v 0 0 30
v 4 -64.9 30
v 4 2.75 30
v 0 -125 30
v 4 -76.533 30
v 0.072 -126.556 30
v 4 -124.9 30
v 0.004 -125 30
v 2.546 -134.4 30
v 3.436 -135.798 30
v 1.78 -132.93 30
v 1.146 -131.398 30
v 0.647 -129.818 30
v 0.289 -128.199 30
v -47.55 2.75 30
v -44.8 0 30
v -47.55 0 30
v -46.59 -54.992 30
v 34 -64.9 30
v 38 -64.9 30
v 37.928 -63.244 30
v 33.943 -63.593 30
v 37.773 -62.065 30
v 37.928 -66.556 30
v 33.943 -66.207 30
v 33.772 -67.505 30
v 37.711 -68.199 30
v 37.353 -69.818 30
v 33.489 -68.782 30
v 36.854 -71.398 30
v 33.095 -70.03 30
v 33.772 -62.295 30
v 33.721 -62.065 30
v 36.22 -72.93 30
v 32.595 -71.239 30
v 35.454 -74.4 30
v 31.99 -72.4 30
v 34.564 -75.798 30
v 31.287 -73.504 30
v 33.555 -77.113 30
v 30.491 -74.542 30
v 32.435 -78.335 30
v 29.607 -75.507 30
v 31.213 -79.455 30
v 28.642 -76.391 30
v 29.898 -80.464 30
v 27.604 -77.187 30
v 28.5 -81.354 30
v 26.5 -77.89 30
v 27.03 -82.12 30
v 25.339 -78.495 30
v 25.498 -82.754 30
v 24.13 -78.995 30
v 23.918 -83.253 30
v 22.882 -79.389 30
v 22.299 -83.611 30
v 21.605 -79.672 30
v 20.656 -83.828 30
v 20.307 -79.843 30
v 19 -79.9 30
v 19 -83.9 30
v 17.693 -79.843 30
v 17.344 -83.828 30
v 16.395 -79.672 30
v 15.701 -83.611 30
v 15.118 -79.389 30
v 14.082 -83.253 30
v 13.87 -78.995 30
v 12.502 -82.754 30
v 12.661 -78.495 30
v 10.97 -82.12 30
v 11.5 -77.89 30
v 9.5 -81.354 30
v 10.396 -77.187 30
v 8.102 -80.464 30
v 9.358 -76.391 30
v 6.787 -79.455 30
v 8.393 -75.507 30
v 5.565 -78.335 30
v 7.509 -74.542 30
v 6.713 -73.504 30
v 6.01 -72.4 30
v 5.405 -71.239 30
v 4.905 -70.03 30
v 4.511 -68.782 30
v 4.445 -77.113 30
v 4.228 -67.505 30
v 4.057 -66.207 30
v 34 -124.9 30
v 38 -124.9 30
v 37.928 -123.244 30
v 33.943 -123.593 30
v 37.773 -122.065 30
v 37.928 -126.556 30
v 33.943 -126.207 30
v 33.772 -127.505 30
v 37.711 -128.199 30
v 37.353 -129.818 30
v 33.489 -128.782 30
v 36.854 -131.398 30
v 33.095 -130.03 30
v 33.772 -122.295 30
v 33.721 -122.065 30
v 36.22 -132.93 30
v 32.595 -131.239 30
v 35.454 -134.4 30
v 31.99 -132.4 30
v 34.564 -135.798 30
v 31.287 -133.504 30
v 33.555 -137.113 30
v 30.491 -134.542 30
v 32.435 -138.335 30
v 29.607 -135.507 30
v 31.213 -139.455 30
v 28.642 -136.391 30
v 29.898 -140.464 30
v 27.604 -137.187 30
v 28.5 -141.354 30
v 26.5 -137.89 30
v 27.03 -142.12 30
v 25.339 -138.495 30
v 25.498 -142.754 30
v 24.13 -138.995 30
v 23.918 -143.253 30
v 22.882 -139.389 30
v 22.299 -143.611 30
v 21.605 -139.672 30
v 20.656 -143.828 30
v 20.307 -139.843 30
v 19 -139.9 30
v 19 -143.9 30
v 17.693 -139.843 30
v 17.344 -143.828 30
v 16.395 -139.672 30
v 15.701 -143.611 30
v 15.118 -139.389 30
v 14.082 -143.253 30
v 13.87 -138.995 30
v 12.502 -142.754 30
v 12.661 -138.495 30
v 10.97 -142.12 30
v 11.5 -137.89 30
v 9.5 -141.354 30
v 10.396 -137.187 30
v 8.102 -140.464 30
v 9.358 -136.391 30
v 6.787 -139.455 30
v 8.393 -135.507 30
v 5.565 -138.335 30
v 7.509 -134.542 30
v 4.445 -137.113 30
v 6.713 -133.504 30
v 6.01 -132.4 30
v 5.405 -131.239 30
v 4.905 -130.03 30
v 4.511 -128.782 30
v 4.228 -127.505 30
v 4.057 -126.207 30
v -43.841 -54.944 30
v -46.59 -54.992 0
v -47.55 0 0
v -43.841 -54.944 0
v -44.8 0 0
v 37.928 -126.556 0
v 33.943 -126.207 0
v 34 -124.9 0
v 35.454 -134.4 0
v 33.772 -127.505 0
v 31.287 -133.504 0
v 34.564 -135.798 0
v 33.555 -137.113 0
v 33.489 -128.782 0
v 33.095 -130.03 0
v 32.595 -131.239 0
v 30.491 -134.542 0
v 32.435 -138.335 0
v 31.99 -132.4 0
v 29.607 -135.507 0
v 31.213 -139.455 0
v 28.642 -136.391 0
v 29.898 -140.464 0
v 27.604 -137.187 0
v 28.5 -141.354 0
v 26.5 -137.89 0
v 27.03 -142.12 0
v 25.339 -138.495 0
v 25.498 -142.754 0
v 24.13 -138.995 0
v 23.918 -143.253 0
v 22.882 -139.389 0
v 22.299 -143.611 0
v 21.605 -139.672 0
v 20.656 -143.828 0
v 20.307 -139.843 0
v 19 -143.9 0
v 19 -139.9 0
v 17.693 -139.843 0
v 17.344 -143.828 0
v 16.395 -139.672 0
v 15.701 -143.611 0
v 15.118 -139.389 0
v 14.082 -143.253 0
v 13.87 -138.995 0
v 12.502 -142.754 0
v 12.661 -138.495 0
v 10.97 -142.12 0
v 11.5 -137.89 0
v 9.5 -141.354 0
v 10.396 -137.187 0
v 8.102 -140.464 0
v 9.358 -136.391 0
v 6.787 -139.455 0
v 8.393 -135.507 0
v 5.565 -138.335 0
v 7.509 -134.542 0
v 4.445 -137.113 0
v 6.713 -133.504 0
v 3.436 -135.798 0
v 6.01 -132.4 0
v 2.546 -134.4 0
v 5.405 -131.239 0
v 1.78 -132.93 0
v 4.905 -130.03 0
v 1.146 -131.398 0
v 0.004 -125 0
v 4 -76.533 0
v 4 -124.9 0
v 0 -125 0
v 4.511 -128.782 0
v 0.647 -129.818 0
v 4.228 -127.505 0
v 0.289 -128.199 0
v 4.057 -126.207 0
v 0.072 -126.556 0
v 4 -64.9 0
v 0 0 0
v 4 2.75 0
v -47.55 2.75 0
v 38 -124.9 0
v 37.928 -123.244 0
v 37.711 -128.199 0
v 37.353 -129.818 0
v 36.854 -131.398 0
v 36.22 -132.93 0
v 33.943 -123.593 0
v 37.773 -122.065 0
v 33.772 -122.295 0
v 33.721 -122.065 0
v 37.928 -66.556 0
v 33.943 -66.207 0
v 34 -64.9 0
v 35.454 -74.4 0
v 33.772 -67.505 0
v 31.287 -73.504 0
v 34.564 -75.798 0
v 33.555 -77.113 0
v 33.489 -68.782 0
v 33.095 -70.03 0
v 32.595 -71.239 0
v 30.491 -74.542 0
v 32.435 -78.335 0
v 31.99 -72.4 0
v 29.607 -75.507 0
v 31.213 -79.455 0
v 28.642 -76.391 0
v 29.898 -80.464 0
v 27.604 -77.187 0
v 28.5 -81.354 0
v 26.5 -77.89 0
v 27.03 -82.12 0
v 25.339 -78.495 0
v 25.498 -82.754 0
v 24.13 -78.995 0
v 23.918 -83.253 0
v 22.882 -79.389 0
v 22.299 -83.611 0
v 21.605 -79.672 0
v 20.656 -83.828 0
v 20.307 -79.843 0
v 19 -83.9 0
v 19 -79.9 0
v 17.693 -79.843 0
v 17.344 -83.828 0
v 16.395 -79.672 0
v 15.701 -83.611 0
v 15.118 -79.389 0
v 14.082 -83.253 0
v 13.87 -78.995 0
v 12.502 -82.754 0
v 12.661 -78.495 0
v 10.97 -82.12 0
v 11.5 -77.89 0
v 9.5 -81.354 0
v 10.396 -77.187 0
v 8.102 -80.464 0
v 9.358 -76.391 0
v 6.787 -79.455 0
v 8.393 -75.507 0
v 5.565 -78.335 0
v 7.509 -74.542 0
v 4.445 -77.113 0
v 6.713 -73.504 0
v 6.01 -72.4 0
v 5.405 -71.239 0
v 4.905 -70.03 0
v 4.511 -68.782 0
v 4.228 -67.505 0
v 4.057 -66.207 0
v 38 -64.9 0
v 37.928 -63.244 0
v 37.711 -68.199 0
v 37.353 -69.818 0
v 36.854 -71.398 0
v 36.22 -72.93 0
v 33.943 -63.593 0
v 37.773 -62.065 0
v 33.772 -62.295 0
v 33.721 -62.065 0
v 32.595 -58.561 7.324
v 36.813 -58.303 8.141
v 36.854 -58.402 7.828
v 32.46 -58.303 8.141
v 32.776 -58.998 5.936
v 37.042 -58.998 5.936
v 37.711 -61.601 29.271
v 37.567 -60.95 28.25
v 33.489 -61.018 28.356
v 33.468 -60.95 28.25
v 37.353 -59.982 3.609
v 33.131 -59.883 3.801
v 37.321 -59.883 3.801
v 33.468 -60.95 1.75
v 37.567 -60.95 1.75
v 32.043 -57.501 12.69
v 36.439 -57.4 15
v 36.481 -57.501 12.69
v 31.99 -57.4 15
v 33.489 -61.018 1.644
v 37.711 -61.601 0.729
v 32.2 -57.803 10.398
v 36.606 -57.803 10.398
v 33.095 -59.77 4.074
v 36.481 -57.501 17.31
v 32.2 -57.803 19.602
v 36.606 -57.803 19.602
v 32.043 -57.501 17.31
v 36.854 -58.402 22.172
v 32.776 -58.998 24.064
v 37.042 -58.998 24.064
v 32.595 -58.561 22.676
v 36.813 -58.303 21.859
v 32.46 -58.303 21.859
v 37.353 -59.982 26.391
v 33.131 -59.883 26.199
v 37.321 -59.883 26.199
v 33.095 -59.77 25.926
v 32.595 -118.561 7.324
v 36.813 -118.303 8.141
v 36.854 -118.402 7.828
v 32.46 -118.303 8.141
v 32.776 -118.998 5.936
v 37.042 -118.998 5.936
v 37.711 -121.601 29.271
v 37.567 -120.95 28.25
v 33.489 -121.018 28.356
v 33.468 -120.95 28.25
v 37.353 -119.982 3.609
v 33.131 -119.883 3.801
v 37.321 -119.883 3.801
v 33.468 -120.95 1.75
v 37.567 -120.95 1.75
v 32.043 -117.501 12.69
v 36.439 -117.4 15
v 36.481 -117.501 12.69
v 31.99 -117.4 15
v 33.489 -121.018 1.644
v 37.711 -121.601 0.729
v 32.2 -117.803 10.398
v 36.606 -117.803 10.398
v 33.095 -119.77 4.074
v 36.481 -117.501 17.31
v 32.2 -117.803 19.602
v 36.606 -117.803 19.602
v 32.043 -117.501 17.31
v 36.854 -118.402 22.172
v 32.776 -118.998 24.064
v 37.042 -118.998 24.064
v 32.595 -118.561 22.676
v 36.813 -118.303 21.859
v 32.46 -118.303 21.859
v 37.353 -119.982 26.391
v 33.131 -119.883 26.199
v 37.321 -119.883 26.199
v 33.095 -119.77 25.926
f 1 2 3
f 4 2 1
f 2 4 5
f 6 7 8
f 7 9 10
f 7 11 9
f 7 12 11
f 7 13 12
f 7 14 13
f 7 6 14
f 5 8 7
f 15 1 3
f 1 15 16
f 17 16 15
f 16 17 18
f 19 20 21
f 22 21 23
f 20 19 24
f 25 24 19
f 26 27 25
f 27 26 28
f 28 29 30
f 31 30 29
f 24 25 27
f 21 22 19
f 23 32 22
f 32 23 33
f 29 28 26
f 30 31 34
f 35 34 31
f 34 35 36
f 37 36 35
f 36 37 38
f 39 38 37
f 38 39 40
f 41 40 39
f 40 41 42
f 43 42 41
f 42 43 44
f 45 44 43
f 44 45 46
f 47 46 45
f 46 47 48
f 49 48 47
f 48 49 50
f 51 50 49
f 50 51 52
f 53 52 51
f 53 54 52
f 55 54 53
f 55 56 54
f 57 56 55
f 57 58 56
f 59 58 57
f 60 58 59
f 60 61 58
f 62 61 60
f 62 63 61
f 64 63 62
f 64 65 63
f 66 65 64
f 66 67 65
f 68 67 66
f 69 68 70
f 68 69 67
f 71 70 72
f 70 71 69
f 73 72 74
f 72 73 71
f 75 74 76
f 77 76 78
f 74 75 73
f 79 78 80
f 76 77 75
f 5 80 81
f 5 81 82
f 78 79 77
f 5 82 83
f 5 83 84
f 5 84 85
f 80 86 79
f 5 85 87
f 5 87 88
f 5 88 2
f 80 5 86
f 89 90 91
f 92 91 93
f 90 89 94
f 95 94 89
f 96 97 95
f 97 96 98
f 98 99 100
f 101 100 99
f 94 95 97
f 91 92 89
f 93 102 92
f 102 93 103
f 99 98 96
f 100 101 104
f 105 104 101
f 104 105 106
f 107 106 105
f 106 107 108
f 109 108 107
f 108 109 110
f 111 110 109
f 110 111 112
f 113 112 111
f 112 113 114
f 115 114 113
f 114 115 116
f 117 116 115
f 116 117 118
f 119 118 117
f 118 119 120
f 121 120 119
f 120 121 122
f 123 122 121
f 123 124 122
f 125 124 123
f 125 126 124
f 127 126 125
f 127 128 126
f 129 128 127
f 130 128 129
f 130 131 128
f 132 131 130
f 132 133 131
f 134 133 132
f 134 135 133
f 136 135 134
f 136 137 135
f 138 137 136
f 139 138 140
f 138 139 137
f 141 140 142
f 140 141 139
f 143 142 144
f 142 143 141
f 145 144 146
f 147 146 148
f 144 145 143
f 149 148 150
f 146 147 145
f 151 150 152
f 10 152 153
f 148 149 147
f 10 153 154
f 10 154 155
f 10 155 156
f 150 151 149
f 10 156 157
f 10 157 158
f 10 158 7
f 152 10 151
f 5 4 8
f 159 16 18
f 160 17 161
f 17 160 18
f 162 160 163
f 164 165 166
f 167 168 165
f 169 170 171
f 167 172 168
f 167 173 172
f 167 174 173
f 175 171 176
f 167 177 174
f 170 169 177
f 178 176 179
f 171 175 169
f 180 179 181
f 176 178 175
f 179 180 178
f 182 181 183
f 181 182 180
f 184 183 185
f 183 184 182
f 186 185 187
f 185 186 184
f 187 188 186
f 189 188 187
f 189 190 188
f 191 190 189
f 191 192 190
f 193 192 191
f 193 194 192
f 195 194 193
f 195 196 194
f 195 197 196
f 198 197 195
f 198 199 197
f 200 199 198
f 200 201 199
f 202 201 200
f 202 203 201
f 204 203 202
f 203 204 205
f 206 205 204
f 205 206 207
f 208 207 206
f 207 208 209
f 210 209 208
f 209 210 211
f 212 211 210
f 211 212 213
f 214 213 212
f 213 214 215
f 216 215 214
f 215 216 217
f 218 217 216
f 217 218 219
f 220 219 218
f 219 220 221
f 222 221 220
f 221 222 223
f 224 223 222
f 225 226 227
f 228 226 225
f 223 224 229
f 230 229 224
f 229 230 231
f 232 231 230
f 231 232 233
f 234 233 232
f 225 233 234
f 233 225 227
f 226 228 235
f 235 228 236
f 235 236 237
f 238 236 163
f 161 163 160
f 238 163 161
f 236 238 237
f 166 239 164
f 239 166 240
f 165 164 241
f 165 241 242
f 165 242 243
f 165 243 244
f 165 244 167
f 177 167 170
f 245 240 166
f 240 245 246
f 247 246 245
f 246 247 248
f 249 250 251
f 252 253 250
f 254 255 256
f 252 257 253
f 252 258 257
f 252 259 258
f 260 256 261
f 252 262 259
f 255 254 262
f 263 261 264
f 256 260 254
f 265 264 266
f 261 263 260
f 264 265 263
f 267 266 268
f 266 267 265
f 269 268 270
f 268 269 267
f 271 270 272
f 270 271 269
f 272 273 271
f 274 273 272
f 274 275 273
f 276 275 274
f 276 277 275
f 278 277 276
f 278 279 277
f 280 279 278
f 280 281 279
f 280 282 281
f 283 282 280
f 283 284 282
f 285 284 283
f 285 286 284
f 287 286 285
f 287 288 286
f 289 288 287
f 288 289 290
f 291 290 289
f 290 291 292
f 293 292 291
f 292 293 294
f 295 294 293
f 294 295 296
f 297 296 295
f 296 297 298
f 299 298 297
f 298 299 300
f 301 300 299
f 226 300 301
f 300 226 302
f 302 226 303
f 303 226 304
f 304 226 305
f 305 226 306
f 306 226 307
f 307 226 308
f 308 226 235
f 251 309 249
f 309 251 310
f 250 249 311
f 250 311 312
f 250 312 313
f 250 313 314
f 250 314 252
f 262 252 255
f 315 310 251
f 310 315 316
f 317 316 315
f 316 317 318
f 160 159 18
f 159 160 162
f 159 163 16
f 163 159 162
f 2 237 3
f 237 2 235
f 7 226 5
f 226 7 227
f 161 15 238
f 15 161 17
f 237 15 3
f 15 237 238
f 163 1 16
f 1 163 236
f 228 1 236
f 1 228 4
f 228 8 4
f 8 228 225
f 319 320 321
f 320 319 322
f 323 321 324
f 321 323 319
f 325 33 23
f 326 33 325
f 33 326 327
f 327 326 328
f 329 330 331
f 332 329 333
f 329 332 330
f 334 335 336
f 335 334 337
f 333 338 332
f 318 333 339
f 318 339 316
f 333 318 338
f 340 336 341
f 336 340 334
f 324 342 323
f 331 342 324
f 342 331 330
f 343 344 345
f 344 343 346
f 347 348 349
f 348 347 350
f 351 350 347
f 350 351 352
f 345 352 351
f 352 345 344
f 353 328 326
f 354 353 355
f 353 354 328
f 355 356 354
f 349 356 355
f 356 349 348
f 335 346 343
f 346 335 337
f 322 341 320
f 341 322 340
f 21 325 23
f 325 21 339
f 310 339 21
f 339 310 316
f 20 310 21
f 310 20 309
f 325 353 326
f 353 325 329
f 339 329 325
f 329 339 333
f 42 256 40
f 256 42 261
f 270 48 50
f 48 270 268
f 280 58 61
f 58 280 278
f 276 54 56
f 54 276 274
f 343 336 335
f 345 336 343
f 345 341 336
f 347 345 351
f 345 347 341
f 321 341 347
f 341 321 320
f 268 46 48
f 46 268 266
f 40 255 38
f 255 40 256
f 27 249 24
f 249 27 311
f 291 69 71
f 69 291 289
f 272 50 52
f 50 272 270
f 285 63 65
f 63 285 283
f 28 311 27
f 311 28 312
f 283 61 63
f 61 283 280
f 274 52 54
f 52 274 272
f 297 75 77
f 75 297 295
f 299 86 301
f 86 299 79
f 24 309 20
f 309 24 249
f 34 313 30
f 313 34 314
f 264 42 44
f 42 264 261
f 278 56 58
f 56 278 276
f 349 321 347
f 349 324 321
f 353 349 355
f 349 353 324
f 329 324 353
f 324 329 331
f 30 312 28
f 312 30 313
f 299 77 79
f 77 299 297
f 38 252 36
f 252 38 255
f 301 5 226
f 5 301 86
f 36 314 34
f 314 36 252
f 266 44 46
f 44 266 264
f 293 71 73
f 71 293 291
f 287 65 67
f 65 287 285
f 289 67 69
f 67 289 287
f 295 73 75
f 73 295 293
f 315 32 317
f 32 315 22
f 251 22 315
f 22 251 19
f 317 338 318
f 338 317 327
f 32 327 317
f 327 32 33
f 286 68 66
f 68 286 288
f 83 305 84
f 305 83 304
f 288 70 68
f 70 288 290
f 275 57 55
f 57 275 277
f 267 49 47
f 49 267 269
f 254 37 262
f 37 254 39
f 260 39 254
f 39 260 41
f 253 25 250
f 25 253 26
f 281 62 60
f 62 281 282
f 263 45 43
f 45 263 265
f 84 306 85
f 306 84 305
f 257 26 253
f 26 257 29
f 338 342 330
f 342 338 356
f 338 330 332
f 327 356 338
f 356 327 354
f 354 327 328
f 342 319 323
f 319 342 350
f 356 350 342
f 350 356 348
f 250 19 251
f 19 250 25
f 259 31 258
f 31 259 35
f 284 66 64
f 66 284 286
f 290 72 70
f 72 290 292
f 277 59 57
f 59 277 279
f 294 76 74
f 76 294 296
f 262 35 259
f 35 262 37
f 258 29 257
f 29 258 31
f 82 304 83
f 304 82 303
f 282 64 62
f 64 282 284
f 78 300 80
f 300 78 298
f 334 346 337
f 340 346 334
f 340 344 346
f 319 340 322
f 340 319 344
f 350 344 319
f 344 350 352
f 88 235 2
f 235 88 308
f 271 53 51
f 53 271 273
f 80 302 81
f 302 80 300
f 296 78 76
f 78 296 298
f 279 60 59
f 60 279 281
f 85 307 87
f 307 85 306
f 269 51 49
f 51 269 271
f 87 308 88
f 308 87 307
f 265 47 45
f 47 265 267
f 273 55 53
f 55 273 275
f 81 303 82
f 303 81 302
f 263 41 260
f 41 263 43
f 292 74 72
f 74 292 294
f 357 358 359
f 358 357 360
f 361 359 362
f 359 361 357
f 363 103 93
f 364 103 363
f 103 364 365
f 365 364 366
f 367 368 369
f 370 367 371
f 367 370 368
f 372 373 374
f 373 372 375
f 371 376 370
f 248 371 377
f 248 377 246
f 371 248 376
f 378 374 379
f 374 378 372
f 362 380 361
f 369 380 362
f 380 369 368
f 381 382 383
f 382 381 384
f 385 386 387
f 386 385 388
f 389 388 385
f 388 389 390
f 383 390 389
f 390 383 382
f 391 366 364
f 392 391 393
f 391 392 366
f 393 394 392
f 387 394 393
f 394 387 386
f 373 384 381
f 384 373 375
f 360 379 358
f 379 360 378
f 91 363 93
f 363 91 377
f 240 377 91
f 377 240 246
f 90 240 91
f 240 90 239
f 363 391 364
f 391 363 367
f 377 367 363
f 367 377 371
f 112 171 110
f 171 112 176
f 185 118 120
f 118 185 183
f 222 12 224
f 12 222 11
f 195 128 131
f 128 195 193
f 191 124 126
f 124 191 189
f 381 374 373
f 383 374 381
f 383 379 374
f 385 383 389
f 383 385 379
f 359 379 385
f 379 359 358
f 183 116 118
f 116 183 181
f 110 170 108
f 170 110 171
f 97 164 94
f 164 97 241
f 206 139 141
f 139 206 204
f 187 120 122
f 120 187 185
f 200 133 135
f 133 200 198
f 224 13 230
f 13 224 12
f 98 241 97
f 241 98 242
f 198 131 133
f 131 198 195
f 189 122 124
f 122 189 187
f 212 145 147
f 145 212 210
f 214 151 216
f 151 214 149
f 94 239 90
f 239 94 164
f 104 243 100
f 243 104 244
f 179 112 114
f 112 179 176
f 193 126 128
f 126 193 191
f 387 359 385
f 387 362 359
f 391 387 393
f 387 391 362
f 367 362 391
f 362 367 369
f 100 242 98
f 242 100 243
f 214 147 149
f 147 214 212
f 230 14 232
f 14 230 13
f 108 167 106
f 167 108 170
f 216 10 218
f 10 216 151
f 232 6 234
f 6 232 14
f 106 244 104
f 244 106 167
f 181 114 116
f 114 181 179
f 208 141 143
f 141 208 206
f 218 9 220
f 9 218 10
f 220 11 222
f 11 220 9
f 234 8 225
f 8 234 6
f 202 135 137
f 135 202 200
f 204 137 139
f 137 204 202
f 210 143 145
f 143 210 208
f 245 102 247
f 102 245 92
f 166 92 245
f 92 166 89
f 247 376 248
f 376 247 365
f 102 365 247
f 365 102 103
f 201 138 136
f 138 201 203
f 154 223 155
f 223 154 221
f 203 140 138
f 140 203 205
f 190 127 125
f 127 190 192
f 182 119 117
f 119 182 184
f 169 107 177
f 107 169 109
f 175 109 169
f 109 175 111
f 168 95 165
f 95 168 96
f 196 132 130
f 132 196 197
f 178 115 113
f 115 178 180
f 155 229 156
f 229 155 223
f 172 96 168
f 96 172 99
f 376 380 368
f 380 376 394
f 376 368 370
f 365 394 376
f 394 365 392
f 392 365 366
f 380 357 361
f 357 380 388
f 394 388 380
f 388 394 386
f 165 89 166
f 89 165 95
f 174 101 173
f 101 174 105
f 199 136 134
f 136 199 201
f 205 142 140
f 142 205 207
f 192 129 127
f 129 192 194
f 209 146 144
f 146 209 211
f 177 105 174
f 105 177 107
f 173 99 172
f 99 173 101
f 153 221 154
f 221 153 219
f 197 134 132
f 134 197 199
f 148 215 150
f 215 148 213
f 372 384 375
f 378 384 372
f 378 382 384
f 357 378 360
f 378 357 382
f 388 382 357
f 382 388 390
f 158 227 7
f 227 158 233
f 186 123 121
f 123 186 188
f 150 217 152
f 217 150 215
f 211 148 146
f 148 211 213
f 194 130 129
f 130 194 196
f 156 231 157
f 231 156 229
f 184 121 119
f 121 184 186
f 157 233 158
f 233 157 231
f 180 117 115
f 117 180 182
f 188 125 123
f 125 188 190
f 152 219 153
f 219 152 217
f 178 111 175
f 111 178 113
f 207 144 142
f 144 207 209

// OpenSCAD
/* [Door parameters] */
// Door thickness (inner distance between front and back of door hook)
clip_depth = 44.8;
// Thickness of top and overhang (make sure it fits gap between door and frame)
top_and_back_thickness = 2.75;

/* [Hook parameters] */
// Width of entire hook
width = 30;
// Thickness of front piece and hanger hooks
hook_and_front_thickness = 4;
// Length of overhang on back side of the door
clip_length = 55;


number_of_hooks = 2;
// Distance between top of door and first hanger hook
first_hook_offset = 65;  // rounded: 60
// Distance between successive hanger hooks (if more than one)
hook_distance = 60;  // rounded: 60
// Radius of hanger hook curve
hook_radius = 15;

hook_style = "rounded"; // [simple:Simple,rounded:Rounded]

/* [Advanced] */

// Angle back of clip inwards (towards door), to help with friction; don't go crazy with this or you'll put too much stress on clip
clip_angle = 1;
// Add support buttress on hooks (except last); might help reduce flex, but looks a bit uglier (IMO)
inner_hook_buttress = 0; // [0:No,1:Yes]


/* [Hidden] */

$fn = 72;
thickness = hook_and_front_thickness;
top_thickness = top_and_back_thickness;

module hook_base() {
  difference() {
    cylinder(h=width, r=hook_radius+thickness);
    translate([0,0,-1])
      cylinder(h=width+2, r=hook_radius);
    translate([-hook_radius-thickness-1, 0, -1]) 
      cube([2*(hook_radius+thickness+1), hook_radius+thickness+1, width+2]); 
  }
}

module simple_hook() {
  translate([hook_radius+thickness, 0, 0]) union() {
    hook_base();
    translate([hook_radius+thickness/2, 0, 0])
      cylinder(h=width, r=thickness/2, $fn=18);
  }
}

module rounded_hook0() {
  translate([hook_radius+thickness, 0, 0]) union(r=2) {
    hook_base();
    translate([thickness+hook_radius, 0, width/2]) rotate([0, 90, 180]) difference() {
      cylinder(h=thickness, r=width/2);
      //translate([-width/2, -width/2, 0]) cube([width,width,thickness]);
      translate([-width-1, .5, -1])
        cube([2*width+2, width+1, thickness+2]);
    }
  }
}

module rounded_hook() {
  translate([0, -hook_radius-thickness, 0]) difference() {
    intersection() {
      cube([2*(hook_radius+thickness), 1.5*hook_radius+thickness+1, width]);
      translate([0, 0, width/2]) rotate([0, 90, 0]) cylinder(h=2*(hook_radius+thickness), r=1.5*hook_radius+thickness);
      translate([hook_radius+thickness, hook_radius+thickness, -1]) cylinder(r=hook_radius+thickness, h=width+2);
    }
    translate([hook_radius+thickness, hook_radius+thickness, -1]) cylinder(r=hook_radius, h=width+2);
    translate([-1, hook_radius+thickness, -1]) cube([hook_radius+thickness+2, hook_radius, width+2]);
  }
}

module hook() {
  if (hook_style == "simple") {
    simple_hook();
  } else if (hook_style == "rounded") {
    rounded_hook();
  }
}

module clip() {
  front_length = first_hook_offset + (number_of_hooks - 1) * hook_distance;
  union() {
    translate([-clip_depth-top_thickness, 0, 0]) rotate([0, 0, clip_angle]) translate([0, -clip_length, 0])
      cube([top_thickness, clip_length, width]);
    translate([-clip_depth-top_thickness, 0, 0])
      cube([clip_depth + top_thickness + thickness, top_thickness, width]);
    translate([0, -front_length, 0])
      cube([thickness, front_length, width]);
  }
}

module door_hook() {
  butt_theta = acos(hook_radius/(hook_radius+thickness));
  clip();
  for (i = [0:(number_of_hooks-1)]) {
    translate([0, -first_hook_offset-i*hook_distance+.1, 0]) union() {
      hook();
      if ((i < number_of_hooks-1) && (inner_hook_buttress != 0)) {
        translate([0,-(hook_radius+thickness)*tan(butt_theta),0]) rotate([0, 0, butt_theta]) translate([0, -thickness, 0]) cube([thickness*(1+1/cos(butt_theta)),thickness,width]);
      }
    }
  }
}

door_hook();
